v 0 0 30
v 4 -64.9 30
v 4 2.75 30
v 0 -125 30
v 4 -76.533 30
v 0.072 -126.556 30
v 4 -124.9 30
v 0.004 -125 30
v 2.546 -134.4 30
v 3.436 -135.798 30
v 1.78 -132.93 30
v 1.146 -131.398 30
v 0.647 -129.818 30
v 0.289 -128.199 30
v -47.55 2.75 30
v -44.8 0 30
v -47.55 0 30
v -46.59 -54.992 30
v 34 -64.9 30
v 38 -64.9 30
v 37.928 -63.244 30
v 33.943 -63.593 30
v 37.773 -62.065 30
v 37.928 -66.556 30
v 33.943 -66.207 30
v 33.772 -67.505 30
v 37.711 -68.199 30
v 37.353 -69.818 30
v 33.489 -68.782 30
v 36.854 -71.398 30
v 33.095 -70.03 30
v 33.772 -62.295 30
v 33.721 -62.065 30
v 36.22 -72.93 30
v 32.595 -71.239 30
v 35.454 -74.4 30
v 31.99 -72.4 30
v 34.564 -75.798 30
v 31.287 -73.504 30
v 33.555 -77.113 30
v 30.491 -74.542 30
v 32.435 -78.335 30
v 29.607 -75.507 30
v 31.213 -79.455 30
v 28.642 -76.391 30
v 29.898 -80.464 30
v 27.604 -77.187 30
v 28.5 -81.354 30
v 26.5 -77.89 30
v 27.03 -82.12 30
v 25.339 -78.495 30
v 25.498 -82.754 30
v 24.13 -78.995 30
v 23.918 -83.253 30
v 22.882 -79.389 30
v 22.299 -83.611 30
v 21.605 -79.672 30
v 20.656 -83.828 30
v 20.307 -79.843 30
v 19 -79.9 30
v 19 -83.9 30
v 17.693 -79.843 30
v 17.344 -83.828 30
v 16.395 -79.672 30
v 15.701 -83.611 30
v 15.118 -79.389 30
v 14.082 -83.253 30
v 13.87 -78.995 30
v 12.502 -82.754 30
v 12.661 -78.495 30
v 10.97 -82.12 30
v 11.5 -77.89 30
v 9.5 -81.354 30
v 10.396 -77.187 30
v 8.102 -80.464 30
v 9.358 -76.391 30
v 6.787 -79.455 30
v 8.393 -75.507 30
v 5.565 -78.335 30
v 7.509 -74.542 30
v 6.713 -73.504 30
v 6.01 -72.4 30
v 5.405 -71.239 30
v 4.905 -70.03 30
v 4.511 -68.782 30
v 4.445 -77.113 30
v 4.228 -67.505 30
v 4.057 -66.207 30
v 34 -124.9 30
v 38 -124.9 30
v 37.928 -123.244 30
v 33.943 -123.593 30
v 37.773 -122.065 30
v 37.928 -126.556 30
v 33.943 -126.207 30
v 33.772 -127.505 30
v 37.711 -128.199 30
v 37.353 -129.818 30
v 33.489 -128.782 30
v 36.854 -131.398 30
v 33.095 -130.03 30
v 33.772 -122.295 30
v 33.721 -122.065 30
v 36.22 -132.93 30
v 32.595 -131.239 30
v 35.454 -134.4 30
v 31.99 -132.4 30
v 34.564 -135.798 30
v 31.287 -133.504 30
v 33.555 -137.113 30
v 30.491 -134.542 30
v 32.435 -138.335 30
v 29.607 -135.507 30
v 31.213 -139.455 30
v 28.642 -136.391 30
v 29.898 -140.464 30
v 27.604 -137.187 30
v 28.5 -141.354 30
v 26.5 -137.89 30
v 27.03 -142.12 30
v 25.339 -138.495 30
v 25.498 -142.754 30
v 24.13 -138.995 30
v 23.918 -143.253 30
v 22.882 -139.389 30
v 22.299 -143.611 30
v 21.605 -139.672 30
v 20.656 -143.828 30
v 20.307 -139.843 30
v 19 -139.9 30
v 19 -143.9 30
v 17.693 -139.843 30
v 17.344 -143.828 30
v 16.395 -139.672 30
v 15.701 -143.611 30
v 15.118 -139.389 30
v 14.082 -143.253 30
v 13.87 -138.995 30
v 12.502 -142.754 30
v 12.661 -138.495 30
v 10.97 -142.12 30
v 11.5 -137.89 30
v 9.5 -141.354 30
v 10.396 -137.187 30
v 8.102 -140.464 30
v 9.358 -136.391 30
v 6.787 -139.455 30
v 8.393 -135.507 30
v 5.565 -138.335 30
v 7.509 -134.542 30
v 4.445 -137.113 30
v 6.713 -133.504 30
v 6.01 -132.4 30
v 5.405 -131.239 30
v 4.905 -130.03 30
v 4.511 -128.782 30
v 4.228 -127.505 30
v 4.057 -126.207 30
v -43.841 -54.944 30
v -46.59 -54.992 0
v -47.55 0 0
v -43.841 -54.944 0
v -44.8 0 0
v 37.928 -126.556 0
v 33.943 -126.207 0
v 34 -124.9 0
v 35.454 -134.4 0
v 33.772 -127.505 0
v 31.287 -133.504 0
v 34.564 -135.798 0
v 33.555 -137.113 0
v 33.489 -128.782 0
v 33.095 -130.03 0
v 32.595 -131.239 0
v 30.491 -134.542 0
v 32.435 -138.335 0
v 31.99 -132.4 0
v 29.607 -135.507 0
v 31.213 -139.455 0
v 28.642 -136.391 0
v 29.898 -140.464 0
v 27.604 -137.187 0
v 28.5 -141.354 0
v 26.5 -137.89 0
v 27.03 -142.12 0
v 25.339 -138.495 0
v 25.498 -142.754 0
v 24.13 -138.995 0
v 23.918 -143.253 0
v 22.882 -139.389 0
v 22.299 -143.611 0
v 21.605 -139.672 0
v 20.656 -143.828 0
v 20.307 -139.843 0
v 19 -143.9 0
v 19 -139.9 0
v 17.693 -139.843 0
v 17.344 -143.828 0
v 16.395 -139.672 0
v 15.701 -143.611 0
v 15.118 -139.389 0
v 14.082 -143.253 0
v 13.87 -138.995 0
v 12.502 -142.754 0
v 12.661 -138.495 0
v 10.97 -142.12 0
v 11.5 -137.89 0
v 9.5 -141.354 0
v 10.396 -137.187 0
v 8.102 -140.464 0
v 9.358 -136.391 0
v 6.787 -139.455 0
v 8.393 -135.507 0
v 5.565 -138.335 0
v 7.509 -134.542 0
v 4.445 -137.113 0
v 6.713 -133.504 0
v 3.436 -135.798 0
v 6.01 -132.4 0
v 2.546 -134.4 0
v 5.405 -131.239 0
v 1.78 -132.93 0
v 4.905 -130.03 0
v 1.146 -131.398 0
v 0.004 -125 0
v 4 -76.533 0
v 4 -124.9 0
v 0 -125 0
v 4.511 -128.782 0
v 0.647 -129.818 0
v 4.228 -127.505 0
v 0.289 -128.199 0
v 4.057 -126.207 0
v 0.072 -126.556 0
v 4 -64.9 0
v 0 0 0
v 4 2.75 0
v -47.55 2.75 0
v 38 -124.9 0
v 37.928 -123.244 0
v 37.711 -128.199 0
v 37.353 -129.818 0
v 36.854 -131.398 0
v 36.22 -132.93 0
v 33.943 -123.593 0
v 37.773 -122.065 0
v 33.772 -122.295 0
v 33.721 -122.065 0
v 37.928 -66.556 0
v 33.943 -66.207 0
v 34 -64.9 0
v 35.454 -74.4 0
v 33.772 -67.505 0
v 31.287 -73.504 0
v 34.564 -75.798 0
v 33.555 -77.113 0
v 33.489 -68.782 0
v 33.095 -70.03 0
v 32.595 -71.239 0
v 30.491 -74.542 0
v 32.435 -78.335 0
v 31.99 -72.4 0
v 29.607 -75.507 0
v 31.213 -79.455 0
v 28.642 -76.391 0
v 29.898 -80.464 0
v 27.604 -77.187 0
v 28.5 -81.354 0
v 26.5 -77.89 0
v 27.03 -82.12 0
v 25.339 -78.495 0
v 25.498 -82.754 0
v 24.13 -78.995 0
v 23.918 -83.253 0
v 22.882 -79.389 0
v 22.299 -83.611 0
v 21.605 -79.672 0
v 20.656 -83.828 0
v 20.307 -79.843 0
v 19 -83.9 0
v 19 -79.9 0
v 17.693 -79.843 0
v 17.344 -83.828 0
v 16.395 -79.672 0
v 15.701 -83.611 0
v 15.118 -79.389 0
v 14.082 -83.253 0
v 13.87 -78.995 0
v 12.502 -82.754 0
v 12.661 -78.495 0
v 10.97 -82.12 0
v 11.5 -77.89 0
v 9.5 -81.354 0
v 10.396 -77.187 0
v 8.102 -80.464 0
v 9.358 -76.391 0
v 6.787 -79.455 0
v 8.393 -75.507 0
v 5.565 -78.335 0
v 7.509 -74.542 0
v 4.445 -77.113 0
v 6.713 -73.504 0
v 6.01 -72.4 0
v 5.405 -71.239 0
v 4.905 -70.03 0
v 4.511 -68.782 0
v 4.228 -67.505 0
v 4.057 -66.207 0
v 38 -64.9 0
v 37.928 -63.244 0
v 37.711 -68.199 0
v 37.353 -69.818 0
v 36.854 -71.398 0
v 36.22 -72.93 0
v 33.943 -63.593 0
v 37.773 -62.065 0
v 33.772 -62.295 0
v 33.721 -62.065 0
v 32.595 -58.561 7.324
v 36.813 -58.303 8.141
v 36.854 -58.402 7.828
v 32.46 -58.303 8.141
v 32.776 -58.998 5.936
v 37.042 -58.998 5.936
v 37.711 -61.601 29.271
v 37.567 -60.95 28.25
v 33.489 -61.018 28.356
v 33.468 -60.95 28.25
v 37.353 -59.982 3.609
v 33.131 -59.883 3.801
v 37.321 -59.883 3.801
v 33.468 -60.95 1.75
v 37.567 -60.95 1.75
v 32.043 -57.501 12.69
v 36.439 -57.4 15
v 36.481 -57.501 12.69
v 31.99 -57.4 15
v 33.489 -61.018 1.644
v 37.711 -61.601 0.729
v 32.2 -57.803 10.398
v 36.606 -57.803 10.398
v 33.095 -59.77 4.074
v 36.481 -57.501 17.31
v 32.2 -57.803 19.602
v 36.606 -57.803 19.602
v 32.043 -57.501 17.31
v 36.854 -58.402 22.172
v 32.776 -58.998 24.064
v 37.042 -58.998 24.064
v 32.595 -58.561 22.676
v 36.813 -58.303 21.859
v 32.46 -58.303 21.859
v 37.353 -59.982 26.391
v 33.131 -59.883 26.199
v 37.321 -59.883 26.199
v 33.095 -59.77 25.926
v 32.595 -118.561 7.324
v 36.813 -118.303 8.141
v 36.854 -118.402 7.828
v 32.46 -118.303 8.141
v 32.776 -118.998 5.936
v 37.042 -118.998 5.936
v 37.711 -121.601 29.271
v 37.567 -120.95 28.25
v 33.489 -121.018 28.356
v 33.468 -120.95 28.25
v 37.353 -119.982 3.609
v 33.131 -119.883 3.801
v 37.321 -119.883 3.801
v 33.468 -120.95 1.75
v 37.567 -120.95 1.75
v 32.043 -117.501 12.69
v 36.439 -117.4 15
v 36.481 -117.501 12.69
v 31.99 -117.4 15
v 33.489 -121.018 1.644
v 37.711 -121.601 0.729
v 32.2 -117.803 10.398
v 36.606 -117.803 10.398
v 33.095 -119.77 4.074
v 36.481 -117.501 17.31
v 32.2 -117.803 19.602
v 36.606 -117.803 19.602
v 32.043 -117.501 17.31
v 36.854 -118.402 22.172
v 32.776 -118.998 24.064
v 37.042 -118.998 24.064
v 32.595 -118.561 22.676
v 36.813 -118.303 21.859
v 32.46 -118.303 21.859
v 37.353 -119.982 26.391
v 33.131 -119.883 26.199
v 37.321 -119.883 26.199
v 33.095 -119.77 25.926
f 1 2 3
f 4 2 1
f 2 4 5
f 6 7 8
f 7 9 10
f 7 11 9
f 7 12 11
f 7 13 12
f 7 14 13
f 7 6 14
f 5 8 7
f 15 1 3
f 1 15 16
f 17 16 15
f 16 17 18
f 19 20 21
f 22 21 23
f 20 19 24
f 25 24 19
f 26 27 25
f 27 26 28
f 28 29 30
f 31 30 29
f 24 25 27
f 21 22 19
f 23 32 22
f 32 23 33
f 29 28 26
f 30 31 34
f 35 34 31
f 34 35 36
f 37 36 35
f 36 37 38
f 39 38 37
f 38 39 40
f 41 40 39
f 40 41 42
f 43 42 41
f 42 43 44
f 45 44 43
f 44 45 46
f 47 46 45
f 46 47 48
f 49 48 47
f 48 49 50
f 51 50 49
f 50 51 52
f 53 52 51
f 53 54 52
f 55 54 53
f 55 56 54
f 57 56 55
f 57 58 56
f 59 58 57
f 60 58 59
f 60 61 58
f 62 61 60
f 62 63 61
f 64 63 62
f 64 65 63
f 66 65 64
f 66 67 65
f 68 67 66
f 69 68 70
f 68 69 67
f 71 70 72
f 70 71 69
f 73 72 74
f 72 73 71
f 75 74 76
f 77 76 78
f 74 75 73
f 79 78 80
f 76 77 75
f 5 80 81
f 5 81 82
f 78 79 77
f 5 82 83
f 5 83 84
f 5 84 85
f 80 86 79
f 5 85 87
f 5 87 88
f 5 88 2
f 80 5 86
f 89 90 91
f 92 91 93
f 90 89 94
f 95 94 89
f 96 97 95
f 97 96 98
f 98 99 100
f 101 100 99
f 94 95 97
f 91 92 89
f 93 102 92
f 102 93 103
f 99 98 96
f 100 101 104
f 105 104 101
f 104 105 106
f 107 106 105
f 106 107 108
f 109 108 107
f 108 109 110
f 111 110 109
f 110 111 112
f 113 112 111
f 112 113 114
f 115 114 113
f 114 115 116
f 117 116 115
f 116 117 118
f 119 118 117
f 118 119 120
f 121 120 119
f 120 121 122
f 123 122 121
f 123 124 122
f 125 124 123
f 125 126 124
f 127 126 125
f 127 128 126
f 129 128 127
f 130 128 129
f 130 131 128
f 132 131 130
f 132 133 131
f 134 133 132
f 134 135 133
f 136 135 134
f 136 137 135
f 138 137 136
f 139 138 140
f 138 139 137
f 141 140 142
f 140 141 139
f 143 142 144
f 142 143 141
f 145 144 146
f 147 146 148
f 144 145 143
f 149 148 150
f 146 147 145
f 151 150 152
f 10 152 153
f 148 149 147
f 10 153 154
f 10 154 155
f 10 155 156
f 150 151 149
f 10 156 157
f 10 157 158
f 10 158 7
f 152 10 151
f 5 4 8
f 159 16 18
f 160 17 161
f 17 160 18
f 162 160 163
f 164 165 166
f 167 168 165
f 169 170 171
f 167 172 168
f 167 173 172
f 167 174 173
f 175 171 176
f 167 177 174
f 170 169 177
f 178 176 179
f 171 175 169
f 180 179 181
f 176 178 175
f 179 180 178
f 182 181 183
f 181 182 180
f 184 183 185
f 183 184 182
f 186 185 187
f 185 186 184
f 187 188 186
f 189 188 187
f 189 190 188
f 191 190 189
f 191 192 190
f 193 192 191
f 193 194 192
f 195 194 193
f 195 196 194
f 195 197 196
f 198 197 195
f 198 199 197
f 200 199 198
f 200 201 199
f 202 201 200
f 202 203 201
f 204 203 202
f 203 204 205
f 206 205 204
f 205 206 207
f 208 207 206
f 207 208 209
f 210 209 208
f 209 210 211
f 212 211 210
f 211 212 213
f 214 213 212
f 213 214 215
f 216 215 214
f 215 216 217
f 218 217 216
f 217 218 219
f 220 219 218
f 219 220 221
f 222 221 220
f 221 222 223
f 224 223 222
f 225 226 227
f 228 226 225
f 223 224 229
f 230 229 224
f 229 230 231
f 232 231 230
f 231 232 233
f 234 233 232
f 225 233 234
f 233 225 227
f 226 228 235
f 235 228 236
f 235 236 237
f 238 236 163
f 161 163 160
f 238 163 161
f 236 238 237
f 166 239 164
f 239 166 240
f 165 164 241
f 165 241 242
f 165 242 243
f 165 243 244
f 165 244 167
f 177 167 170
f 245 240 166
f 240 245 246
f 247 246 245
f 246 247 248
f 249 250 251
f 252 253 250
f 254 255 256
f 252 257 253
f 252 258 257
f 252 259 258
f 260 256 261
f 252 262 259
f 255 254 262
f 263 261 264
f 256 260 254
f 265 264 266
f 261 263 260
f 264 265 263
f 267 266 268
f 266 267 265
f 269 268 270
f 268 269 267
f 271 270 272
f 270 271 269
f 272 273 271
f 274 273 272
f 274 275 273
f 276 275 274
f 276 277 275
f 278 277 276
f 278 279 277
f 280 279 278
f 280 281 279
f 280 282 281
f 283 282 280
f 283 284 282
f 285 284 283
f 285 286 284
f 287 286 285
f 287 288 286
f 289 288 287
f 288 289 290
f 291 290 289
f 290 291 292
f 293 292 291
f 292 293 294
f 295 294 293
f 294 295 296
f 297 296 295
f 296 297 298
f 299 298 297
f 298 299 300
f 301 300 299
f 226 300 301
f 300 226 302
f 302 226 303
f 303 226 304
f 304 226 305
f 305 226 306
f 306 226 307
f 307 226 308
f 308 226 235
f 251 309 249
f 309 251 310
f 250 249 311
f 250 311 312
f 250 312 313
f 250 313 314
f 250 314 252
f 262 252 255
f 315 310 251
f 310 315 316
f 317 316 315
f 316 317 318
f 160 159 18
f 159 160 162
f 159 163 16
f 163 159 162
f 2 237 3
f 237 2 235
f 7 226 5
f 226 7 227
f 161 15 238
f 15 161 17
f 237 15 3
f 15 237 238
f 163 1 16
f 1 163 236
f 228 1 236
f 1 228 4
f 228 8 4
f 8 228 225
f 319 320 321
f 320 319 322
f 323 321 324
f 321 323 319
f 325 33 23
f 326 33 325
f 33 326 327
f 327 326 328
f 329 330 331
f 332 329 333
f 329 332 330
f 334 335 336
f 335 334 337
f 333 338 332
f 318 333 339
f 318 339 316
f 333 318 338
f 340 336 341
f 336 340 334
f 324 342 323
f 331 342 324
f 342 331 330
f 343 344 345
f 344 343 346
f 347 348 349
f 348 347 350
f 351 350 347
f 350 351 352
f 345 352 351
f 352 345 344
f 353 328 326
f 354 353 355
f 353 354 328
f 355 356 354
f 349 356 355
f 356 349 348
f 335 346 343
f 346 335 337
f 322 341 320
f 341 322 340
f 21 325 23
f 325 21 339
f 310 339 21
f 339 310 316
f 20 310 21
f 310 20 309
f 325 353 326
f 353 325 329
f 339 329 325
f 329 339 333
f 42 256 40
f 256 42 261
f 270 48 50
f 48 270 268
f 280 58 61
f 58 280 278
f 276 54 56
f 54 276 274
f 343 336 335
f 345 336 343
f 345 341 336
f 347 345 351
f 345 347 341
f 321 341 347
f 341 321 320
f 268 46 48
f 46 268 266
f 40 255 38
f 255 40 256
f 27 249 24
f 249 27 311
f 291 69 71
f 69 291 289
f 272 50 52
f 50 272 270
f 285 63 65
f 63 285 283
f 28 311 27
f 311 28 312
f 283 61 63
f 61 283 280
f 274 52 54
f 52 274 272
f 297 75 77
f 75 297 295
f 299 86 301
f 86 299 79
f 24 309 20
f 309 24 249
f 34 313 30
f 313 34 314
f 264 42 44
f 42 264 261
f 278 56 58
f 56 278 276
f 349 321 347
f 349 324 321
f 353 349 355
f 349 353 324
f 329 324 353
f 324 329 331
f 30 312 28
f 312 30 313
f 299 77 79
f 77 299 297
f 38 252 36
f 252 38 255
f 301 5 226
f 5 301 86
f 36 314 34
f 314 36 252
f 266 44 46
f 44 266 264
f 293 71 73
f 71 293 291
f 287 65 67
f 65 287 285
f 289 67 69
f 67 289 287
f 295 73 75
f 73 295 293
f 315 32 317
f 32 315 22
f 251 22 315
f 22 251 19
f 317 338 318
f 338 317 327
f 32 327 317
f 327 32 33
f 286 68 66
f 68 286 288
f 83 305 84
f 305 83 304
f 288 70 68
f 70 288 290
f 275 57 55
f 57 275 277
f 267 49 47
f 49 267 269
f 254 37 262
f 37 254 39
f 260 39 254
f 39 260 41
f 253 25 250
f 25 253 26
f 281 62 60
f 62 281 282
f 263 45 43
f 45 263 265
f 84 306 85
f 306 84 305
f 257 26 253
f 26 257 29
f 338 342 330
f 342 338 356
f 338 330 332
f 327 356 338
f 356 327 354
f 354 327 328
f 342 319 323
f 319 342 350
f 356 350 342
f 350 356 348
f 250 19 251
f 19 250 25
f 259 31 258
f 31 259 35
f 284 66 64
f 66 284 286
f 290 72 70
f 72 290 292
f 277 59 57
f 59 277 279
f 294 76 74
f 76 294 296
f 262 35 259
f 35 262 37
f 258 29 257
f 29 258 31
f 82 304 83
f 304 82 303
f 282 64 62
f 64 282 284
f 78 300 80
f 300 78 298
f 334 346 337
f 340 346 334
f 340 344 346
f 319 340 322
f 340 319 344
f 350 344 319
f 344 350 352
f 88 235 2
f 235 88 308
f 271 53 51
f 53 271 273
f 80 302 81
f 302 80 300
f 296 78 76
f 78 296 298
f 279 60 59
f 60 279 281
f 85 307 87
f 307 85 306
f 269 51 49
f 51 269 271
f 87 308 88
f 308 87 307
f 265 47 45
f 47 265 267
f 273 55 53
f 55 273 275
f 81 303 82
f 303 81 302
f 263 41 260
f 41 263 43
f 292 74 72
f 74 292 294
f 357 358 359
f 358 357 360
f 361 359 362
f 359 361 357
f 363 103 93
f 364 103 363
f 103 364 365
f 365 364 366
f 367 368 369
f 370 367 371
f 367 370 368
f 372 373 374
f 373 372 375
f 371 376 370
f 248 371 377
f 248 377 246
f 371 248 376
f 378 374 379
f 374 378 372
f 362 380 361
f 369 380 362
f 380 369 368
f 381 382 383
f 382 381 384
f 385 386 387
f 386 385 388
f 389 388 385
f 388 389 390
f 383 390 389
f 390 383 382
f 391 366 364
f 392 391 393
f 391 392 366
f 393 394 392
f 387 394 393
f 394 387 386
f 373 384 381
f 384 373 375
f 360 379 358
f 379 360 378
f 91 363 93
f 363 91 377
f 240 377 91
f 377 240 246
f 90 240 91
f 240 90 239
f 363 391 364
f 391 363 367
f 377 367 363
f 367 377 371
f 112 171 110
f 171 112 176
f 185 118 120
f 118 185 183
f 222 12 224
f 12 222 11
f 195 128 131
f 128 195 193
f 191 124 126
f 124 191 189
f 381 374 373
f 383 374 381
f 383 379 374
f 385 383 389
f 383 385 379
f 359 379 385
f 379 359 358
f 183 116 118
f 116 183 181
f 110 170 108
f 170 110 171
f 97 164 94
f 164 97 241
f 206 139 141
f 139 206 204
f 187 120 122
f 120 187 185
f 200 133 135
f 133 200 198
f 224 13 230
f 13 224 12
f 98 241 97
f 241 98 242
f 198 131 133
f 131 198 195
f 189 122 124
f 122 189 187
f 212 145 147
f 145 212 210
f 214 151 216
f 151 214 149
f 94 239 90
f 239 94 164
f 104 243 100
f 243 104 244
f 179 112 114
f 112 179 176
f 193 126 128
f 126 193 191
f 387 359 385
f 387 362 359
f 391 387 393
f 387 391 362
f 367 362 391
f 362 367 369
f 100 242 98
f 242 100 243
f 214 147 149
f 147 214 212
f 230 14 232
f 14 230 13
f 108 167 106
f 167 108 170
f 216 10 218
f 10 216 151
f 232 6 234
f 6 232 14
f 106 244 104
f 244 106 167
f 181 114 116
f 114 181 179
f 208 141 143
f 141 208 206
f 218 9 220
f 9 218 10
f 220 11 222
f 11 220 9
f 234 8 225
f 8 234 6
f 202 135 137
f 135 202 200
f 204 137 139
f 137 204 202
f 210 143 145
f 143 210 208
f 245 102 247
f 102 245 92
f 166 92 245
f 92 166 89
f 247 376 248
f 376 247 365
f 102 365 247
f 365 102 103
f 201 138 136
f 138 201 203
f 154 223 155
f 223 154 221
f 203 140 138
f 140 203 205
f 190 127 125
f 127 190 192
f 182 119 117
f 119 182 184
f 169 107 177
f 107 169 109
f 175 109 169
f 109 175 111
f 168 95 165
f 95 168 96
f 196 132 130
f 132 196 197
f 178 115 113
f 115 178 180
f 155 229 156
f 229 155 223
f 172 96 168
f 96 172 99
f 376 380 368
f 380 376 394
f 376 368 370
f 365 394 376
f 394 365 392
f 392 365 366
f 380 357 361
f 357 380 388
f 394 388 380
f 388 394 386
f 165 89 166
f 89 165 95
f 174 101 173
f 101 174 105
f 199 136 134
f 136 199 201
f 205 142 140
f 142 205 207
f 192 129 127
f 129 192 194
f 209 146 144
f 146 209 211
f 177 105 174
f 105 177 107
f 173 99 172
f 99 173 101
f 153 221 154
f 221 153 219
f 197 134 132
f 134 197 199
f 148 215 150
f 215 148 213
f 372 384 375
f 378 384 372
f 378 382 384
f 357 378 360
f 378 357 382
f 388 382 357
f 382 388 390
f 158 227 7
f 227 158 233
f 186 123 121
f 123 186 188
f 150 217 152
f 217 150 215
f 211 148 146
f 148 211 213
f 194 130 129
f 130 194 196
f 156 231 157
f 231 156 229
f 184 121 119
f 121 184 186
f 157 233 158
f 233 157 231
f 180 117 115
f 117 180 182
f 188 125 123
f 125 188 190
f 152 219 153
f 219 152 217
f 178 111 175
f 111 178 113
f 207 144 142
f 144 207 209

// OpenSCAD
/* [Door parameters] */
// Door thickness (inner distance between front and back of door hook)
clip_depth = 44.8;
// Thickness of top and overhang (make sure it fits gap between door and frame)
top_and_back_thickness = 2.75;

/* [Hook parameters] */
// Width of entire hook
width = 30;
// Thickness of front piece and hanger hooks
hook_and_front_thickness = 4;
// Length of overhang on back side of the door
clip_length = 55;


number_of_hooks = 2;
// Distance between top of door and first hanger hook
first_hook_offset = 65;  // rounded: 60
// Distance between successive hanger hooks (if more than one)
hook_distance = 60;  // rounded: 60
// Radius of hanger hook curve
hook_radius = 15;

hook_style = "rounded"; // [simple:Simple,rounded:Rounded]

/* [Advanced] */

// Angle back of clip inwards (towards door), to help with friction; don't go crazy with this or you'll put too much stress on clip
clip_angle = 1;
// Add support buttress on hooks (except last); might help reduce flex, but looks a bit uglier (IMO)
inner_hook_buttress = 0; // [0:No,1:Yes]


/* [Hidden] */

$fn = 72;
thickness = hook_and_front_thickness;
top_thickness = top_and_back_thickness;

module hook_base() {
  difference() {
    cylinder(h=width, r=hook_radius+thickness);
    translate([0,0,-1])
      cylinder(h=width+2, r=hook_radius);
    translate([-hook_radius-thickness-1, 0, -1]) 
      cube([2*(hook_radius+thickness+1), hook_radius+thickness+1, width+2]); 
  }
}

module simple_hook() {
  translate([hook_radius+thickness, 0, 0]) union() {
    hook_base();
    translate([hook_radius+thickness/2, 0, 0])
      cylinder(h=width, r=thickness/2, $fn=18);
  }
}

module rounded_hook0() {
  translate([hook_radius+thickness, 0, 0]) union(r=2) {
    hook_base();
    translate([thickness+hook_radius, 0, width/2]) rotate([0, 90, 180]) difference() {
      cylinder(h=thickness, r=width/2);
      //translate([-width/2, -width/2, 0]) cube([width,width,thickness]);
      translate([-width-1, .5, -1])
        cube([2*width+2, width+1, thickness+2]);
    }
  }
}

module rounded_hook() {
  translate([0, -hook_radius-thickness, 0]) difference() {
    intersection() {
      cube([2*(hook_radius+thickness), 1.5*hook_radius+thickness+1, width]);
      translate([0, 0, width/2]) rotate([0, 90, 0]) cylinder(h=2*(hook_radius+thickness), r=1.5*hook_radius+thickness);
      translate([hook_radius+thickness, hook_radius+thickness, -1]) cylinder(r=hook_radius+thickness, h=width+2);
    }
    translate([hook_radius+thickness, hook_radius+thickness, -1]) cylinder(r=hook_radius, h=width+2);
    translate([-1, hook_radius+thickness, -1]) cube([hook_radius+thickness+2, hook_radius, width+2]);
  }
}

module hook() {
  if (hook_style == "simple") {
    simple_hook();
  } else if (hook_style == "rounded") {
    rounded_hook();
  }
}

module clip() {
  front_length = first_hook_offset + (number_of_hooks - 1) * hook_distance;
  union() {
    translate([-clip_depth-top_thickness, 0, 0]) rotate([0, 0, clip_angle]) translate([0, -clip_length, 0])
      cube([top_thickness, clip_length, width]);
    translate([-clip_depth-top_thickness, 0, 0])
      cube([clip_depth + top_thickness + thickness, top_thickness, width]);
    translate([0, -front_length, 0])
      cube([thickness, front_length, width]);
  }
}

module door_hook() {
  butt_theta = acos(hook_radius/(hook_radius+thickness));
  clip();
  for (i = [0:(number_of_hooks-1)]) {
    translate([0, -first_hook_offset-i*hook_distance+.1, 0]) union() {
      hook();
      if ((i < number_of_hooks-1) && (inner_hook_buttress != 0)) {
        translate([0,-(hook_radius+thickness)*tan(butt_theta),0]) rotate([0, 0, butt_theta]) translate([0, -thickness, 0]) cube([thickness*(1+1/cos(butt_theta)),thickness,width]);
      }
    }
  }
}

door_hook();
